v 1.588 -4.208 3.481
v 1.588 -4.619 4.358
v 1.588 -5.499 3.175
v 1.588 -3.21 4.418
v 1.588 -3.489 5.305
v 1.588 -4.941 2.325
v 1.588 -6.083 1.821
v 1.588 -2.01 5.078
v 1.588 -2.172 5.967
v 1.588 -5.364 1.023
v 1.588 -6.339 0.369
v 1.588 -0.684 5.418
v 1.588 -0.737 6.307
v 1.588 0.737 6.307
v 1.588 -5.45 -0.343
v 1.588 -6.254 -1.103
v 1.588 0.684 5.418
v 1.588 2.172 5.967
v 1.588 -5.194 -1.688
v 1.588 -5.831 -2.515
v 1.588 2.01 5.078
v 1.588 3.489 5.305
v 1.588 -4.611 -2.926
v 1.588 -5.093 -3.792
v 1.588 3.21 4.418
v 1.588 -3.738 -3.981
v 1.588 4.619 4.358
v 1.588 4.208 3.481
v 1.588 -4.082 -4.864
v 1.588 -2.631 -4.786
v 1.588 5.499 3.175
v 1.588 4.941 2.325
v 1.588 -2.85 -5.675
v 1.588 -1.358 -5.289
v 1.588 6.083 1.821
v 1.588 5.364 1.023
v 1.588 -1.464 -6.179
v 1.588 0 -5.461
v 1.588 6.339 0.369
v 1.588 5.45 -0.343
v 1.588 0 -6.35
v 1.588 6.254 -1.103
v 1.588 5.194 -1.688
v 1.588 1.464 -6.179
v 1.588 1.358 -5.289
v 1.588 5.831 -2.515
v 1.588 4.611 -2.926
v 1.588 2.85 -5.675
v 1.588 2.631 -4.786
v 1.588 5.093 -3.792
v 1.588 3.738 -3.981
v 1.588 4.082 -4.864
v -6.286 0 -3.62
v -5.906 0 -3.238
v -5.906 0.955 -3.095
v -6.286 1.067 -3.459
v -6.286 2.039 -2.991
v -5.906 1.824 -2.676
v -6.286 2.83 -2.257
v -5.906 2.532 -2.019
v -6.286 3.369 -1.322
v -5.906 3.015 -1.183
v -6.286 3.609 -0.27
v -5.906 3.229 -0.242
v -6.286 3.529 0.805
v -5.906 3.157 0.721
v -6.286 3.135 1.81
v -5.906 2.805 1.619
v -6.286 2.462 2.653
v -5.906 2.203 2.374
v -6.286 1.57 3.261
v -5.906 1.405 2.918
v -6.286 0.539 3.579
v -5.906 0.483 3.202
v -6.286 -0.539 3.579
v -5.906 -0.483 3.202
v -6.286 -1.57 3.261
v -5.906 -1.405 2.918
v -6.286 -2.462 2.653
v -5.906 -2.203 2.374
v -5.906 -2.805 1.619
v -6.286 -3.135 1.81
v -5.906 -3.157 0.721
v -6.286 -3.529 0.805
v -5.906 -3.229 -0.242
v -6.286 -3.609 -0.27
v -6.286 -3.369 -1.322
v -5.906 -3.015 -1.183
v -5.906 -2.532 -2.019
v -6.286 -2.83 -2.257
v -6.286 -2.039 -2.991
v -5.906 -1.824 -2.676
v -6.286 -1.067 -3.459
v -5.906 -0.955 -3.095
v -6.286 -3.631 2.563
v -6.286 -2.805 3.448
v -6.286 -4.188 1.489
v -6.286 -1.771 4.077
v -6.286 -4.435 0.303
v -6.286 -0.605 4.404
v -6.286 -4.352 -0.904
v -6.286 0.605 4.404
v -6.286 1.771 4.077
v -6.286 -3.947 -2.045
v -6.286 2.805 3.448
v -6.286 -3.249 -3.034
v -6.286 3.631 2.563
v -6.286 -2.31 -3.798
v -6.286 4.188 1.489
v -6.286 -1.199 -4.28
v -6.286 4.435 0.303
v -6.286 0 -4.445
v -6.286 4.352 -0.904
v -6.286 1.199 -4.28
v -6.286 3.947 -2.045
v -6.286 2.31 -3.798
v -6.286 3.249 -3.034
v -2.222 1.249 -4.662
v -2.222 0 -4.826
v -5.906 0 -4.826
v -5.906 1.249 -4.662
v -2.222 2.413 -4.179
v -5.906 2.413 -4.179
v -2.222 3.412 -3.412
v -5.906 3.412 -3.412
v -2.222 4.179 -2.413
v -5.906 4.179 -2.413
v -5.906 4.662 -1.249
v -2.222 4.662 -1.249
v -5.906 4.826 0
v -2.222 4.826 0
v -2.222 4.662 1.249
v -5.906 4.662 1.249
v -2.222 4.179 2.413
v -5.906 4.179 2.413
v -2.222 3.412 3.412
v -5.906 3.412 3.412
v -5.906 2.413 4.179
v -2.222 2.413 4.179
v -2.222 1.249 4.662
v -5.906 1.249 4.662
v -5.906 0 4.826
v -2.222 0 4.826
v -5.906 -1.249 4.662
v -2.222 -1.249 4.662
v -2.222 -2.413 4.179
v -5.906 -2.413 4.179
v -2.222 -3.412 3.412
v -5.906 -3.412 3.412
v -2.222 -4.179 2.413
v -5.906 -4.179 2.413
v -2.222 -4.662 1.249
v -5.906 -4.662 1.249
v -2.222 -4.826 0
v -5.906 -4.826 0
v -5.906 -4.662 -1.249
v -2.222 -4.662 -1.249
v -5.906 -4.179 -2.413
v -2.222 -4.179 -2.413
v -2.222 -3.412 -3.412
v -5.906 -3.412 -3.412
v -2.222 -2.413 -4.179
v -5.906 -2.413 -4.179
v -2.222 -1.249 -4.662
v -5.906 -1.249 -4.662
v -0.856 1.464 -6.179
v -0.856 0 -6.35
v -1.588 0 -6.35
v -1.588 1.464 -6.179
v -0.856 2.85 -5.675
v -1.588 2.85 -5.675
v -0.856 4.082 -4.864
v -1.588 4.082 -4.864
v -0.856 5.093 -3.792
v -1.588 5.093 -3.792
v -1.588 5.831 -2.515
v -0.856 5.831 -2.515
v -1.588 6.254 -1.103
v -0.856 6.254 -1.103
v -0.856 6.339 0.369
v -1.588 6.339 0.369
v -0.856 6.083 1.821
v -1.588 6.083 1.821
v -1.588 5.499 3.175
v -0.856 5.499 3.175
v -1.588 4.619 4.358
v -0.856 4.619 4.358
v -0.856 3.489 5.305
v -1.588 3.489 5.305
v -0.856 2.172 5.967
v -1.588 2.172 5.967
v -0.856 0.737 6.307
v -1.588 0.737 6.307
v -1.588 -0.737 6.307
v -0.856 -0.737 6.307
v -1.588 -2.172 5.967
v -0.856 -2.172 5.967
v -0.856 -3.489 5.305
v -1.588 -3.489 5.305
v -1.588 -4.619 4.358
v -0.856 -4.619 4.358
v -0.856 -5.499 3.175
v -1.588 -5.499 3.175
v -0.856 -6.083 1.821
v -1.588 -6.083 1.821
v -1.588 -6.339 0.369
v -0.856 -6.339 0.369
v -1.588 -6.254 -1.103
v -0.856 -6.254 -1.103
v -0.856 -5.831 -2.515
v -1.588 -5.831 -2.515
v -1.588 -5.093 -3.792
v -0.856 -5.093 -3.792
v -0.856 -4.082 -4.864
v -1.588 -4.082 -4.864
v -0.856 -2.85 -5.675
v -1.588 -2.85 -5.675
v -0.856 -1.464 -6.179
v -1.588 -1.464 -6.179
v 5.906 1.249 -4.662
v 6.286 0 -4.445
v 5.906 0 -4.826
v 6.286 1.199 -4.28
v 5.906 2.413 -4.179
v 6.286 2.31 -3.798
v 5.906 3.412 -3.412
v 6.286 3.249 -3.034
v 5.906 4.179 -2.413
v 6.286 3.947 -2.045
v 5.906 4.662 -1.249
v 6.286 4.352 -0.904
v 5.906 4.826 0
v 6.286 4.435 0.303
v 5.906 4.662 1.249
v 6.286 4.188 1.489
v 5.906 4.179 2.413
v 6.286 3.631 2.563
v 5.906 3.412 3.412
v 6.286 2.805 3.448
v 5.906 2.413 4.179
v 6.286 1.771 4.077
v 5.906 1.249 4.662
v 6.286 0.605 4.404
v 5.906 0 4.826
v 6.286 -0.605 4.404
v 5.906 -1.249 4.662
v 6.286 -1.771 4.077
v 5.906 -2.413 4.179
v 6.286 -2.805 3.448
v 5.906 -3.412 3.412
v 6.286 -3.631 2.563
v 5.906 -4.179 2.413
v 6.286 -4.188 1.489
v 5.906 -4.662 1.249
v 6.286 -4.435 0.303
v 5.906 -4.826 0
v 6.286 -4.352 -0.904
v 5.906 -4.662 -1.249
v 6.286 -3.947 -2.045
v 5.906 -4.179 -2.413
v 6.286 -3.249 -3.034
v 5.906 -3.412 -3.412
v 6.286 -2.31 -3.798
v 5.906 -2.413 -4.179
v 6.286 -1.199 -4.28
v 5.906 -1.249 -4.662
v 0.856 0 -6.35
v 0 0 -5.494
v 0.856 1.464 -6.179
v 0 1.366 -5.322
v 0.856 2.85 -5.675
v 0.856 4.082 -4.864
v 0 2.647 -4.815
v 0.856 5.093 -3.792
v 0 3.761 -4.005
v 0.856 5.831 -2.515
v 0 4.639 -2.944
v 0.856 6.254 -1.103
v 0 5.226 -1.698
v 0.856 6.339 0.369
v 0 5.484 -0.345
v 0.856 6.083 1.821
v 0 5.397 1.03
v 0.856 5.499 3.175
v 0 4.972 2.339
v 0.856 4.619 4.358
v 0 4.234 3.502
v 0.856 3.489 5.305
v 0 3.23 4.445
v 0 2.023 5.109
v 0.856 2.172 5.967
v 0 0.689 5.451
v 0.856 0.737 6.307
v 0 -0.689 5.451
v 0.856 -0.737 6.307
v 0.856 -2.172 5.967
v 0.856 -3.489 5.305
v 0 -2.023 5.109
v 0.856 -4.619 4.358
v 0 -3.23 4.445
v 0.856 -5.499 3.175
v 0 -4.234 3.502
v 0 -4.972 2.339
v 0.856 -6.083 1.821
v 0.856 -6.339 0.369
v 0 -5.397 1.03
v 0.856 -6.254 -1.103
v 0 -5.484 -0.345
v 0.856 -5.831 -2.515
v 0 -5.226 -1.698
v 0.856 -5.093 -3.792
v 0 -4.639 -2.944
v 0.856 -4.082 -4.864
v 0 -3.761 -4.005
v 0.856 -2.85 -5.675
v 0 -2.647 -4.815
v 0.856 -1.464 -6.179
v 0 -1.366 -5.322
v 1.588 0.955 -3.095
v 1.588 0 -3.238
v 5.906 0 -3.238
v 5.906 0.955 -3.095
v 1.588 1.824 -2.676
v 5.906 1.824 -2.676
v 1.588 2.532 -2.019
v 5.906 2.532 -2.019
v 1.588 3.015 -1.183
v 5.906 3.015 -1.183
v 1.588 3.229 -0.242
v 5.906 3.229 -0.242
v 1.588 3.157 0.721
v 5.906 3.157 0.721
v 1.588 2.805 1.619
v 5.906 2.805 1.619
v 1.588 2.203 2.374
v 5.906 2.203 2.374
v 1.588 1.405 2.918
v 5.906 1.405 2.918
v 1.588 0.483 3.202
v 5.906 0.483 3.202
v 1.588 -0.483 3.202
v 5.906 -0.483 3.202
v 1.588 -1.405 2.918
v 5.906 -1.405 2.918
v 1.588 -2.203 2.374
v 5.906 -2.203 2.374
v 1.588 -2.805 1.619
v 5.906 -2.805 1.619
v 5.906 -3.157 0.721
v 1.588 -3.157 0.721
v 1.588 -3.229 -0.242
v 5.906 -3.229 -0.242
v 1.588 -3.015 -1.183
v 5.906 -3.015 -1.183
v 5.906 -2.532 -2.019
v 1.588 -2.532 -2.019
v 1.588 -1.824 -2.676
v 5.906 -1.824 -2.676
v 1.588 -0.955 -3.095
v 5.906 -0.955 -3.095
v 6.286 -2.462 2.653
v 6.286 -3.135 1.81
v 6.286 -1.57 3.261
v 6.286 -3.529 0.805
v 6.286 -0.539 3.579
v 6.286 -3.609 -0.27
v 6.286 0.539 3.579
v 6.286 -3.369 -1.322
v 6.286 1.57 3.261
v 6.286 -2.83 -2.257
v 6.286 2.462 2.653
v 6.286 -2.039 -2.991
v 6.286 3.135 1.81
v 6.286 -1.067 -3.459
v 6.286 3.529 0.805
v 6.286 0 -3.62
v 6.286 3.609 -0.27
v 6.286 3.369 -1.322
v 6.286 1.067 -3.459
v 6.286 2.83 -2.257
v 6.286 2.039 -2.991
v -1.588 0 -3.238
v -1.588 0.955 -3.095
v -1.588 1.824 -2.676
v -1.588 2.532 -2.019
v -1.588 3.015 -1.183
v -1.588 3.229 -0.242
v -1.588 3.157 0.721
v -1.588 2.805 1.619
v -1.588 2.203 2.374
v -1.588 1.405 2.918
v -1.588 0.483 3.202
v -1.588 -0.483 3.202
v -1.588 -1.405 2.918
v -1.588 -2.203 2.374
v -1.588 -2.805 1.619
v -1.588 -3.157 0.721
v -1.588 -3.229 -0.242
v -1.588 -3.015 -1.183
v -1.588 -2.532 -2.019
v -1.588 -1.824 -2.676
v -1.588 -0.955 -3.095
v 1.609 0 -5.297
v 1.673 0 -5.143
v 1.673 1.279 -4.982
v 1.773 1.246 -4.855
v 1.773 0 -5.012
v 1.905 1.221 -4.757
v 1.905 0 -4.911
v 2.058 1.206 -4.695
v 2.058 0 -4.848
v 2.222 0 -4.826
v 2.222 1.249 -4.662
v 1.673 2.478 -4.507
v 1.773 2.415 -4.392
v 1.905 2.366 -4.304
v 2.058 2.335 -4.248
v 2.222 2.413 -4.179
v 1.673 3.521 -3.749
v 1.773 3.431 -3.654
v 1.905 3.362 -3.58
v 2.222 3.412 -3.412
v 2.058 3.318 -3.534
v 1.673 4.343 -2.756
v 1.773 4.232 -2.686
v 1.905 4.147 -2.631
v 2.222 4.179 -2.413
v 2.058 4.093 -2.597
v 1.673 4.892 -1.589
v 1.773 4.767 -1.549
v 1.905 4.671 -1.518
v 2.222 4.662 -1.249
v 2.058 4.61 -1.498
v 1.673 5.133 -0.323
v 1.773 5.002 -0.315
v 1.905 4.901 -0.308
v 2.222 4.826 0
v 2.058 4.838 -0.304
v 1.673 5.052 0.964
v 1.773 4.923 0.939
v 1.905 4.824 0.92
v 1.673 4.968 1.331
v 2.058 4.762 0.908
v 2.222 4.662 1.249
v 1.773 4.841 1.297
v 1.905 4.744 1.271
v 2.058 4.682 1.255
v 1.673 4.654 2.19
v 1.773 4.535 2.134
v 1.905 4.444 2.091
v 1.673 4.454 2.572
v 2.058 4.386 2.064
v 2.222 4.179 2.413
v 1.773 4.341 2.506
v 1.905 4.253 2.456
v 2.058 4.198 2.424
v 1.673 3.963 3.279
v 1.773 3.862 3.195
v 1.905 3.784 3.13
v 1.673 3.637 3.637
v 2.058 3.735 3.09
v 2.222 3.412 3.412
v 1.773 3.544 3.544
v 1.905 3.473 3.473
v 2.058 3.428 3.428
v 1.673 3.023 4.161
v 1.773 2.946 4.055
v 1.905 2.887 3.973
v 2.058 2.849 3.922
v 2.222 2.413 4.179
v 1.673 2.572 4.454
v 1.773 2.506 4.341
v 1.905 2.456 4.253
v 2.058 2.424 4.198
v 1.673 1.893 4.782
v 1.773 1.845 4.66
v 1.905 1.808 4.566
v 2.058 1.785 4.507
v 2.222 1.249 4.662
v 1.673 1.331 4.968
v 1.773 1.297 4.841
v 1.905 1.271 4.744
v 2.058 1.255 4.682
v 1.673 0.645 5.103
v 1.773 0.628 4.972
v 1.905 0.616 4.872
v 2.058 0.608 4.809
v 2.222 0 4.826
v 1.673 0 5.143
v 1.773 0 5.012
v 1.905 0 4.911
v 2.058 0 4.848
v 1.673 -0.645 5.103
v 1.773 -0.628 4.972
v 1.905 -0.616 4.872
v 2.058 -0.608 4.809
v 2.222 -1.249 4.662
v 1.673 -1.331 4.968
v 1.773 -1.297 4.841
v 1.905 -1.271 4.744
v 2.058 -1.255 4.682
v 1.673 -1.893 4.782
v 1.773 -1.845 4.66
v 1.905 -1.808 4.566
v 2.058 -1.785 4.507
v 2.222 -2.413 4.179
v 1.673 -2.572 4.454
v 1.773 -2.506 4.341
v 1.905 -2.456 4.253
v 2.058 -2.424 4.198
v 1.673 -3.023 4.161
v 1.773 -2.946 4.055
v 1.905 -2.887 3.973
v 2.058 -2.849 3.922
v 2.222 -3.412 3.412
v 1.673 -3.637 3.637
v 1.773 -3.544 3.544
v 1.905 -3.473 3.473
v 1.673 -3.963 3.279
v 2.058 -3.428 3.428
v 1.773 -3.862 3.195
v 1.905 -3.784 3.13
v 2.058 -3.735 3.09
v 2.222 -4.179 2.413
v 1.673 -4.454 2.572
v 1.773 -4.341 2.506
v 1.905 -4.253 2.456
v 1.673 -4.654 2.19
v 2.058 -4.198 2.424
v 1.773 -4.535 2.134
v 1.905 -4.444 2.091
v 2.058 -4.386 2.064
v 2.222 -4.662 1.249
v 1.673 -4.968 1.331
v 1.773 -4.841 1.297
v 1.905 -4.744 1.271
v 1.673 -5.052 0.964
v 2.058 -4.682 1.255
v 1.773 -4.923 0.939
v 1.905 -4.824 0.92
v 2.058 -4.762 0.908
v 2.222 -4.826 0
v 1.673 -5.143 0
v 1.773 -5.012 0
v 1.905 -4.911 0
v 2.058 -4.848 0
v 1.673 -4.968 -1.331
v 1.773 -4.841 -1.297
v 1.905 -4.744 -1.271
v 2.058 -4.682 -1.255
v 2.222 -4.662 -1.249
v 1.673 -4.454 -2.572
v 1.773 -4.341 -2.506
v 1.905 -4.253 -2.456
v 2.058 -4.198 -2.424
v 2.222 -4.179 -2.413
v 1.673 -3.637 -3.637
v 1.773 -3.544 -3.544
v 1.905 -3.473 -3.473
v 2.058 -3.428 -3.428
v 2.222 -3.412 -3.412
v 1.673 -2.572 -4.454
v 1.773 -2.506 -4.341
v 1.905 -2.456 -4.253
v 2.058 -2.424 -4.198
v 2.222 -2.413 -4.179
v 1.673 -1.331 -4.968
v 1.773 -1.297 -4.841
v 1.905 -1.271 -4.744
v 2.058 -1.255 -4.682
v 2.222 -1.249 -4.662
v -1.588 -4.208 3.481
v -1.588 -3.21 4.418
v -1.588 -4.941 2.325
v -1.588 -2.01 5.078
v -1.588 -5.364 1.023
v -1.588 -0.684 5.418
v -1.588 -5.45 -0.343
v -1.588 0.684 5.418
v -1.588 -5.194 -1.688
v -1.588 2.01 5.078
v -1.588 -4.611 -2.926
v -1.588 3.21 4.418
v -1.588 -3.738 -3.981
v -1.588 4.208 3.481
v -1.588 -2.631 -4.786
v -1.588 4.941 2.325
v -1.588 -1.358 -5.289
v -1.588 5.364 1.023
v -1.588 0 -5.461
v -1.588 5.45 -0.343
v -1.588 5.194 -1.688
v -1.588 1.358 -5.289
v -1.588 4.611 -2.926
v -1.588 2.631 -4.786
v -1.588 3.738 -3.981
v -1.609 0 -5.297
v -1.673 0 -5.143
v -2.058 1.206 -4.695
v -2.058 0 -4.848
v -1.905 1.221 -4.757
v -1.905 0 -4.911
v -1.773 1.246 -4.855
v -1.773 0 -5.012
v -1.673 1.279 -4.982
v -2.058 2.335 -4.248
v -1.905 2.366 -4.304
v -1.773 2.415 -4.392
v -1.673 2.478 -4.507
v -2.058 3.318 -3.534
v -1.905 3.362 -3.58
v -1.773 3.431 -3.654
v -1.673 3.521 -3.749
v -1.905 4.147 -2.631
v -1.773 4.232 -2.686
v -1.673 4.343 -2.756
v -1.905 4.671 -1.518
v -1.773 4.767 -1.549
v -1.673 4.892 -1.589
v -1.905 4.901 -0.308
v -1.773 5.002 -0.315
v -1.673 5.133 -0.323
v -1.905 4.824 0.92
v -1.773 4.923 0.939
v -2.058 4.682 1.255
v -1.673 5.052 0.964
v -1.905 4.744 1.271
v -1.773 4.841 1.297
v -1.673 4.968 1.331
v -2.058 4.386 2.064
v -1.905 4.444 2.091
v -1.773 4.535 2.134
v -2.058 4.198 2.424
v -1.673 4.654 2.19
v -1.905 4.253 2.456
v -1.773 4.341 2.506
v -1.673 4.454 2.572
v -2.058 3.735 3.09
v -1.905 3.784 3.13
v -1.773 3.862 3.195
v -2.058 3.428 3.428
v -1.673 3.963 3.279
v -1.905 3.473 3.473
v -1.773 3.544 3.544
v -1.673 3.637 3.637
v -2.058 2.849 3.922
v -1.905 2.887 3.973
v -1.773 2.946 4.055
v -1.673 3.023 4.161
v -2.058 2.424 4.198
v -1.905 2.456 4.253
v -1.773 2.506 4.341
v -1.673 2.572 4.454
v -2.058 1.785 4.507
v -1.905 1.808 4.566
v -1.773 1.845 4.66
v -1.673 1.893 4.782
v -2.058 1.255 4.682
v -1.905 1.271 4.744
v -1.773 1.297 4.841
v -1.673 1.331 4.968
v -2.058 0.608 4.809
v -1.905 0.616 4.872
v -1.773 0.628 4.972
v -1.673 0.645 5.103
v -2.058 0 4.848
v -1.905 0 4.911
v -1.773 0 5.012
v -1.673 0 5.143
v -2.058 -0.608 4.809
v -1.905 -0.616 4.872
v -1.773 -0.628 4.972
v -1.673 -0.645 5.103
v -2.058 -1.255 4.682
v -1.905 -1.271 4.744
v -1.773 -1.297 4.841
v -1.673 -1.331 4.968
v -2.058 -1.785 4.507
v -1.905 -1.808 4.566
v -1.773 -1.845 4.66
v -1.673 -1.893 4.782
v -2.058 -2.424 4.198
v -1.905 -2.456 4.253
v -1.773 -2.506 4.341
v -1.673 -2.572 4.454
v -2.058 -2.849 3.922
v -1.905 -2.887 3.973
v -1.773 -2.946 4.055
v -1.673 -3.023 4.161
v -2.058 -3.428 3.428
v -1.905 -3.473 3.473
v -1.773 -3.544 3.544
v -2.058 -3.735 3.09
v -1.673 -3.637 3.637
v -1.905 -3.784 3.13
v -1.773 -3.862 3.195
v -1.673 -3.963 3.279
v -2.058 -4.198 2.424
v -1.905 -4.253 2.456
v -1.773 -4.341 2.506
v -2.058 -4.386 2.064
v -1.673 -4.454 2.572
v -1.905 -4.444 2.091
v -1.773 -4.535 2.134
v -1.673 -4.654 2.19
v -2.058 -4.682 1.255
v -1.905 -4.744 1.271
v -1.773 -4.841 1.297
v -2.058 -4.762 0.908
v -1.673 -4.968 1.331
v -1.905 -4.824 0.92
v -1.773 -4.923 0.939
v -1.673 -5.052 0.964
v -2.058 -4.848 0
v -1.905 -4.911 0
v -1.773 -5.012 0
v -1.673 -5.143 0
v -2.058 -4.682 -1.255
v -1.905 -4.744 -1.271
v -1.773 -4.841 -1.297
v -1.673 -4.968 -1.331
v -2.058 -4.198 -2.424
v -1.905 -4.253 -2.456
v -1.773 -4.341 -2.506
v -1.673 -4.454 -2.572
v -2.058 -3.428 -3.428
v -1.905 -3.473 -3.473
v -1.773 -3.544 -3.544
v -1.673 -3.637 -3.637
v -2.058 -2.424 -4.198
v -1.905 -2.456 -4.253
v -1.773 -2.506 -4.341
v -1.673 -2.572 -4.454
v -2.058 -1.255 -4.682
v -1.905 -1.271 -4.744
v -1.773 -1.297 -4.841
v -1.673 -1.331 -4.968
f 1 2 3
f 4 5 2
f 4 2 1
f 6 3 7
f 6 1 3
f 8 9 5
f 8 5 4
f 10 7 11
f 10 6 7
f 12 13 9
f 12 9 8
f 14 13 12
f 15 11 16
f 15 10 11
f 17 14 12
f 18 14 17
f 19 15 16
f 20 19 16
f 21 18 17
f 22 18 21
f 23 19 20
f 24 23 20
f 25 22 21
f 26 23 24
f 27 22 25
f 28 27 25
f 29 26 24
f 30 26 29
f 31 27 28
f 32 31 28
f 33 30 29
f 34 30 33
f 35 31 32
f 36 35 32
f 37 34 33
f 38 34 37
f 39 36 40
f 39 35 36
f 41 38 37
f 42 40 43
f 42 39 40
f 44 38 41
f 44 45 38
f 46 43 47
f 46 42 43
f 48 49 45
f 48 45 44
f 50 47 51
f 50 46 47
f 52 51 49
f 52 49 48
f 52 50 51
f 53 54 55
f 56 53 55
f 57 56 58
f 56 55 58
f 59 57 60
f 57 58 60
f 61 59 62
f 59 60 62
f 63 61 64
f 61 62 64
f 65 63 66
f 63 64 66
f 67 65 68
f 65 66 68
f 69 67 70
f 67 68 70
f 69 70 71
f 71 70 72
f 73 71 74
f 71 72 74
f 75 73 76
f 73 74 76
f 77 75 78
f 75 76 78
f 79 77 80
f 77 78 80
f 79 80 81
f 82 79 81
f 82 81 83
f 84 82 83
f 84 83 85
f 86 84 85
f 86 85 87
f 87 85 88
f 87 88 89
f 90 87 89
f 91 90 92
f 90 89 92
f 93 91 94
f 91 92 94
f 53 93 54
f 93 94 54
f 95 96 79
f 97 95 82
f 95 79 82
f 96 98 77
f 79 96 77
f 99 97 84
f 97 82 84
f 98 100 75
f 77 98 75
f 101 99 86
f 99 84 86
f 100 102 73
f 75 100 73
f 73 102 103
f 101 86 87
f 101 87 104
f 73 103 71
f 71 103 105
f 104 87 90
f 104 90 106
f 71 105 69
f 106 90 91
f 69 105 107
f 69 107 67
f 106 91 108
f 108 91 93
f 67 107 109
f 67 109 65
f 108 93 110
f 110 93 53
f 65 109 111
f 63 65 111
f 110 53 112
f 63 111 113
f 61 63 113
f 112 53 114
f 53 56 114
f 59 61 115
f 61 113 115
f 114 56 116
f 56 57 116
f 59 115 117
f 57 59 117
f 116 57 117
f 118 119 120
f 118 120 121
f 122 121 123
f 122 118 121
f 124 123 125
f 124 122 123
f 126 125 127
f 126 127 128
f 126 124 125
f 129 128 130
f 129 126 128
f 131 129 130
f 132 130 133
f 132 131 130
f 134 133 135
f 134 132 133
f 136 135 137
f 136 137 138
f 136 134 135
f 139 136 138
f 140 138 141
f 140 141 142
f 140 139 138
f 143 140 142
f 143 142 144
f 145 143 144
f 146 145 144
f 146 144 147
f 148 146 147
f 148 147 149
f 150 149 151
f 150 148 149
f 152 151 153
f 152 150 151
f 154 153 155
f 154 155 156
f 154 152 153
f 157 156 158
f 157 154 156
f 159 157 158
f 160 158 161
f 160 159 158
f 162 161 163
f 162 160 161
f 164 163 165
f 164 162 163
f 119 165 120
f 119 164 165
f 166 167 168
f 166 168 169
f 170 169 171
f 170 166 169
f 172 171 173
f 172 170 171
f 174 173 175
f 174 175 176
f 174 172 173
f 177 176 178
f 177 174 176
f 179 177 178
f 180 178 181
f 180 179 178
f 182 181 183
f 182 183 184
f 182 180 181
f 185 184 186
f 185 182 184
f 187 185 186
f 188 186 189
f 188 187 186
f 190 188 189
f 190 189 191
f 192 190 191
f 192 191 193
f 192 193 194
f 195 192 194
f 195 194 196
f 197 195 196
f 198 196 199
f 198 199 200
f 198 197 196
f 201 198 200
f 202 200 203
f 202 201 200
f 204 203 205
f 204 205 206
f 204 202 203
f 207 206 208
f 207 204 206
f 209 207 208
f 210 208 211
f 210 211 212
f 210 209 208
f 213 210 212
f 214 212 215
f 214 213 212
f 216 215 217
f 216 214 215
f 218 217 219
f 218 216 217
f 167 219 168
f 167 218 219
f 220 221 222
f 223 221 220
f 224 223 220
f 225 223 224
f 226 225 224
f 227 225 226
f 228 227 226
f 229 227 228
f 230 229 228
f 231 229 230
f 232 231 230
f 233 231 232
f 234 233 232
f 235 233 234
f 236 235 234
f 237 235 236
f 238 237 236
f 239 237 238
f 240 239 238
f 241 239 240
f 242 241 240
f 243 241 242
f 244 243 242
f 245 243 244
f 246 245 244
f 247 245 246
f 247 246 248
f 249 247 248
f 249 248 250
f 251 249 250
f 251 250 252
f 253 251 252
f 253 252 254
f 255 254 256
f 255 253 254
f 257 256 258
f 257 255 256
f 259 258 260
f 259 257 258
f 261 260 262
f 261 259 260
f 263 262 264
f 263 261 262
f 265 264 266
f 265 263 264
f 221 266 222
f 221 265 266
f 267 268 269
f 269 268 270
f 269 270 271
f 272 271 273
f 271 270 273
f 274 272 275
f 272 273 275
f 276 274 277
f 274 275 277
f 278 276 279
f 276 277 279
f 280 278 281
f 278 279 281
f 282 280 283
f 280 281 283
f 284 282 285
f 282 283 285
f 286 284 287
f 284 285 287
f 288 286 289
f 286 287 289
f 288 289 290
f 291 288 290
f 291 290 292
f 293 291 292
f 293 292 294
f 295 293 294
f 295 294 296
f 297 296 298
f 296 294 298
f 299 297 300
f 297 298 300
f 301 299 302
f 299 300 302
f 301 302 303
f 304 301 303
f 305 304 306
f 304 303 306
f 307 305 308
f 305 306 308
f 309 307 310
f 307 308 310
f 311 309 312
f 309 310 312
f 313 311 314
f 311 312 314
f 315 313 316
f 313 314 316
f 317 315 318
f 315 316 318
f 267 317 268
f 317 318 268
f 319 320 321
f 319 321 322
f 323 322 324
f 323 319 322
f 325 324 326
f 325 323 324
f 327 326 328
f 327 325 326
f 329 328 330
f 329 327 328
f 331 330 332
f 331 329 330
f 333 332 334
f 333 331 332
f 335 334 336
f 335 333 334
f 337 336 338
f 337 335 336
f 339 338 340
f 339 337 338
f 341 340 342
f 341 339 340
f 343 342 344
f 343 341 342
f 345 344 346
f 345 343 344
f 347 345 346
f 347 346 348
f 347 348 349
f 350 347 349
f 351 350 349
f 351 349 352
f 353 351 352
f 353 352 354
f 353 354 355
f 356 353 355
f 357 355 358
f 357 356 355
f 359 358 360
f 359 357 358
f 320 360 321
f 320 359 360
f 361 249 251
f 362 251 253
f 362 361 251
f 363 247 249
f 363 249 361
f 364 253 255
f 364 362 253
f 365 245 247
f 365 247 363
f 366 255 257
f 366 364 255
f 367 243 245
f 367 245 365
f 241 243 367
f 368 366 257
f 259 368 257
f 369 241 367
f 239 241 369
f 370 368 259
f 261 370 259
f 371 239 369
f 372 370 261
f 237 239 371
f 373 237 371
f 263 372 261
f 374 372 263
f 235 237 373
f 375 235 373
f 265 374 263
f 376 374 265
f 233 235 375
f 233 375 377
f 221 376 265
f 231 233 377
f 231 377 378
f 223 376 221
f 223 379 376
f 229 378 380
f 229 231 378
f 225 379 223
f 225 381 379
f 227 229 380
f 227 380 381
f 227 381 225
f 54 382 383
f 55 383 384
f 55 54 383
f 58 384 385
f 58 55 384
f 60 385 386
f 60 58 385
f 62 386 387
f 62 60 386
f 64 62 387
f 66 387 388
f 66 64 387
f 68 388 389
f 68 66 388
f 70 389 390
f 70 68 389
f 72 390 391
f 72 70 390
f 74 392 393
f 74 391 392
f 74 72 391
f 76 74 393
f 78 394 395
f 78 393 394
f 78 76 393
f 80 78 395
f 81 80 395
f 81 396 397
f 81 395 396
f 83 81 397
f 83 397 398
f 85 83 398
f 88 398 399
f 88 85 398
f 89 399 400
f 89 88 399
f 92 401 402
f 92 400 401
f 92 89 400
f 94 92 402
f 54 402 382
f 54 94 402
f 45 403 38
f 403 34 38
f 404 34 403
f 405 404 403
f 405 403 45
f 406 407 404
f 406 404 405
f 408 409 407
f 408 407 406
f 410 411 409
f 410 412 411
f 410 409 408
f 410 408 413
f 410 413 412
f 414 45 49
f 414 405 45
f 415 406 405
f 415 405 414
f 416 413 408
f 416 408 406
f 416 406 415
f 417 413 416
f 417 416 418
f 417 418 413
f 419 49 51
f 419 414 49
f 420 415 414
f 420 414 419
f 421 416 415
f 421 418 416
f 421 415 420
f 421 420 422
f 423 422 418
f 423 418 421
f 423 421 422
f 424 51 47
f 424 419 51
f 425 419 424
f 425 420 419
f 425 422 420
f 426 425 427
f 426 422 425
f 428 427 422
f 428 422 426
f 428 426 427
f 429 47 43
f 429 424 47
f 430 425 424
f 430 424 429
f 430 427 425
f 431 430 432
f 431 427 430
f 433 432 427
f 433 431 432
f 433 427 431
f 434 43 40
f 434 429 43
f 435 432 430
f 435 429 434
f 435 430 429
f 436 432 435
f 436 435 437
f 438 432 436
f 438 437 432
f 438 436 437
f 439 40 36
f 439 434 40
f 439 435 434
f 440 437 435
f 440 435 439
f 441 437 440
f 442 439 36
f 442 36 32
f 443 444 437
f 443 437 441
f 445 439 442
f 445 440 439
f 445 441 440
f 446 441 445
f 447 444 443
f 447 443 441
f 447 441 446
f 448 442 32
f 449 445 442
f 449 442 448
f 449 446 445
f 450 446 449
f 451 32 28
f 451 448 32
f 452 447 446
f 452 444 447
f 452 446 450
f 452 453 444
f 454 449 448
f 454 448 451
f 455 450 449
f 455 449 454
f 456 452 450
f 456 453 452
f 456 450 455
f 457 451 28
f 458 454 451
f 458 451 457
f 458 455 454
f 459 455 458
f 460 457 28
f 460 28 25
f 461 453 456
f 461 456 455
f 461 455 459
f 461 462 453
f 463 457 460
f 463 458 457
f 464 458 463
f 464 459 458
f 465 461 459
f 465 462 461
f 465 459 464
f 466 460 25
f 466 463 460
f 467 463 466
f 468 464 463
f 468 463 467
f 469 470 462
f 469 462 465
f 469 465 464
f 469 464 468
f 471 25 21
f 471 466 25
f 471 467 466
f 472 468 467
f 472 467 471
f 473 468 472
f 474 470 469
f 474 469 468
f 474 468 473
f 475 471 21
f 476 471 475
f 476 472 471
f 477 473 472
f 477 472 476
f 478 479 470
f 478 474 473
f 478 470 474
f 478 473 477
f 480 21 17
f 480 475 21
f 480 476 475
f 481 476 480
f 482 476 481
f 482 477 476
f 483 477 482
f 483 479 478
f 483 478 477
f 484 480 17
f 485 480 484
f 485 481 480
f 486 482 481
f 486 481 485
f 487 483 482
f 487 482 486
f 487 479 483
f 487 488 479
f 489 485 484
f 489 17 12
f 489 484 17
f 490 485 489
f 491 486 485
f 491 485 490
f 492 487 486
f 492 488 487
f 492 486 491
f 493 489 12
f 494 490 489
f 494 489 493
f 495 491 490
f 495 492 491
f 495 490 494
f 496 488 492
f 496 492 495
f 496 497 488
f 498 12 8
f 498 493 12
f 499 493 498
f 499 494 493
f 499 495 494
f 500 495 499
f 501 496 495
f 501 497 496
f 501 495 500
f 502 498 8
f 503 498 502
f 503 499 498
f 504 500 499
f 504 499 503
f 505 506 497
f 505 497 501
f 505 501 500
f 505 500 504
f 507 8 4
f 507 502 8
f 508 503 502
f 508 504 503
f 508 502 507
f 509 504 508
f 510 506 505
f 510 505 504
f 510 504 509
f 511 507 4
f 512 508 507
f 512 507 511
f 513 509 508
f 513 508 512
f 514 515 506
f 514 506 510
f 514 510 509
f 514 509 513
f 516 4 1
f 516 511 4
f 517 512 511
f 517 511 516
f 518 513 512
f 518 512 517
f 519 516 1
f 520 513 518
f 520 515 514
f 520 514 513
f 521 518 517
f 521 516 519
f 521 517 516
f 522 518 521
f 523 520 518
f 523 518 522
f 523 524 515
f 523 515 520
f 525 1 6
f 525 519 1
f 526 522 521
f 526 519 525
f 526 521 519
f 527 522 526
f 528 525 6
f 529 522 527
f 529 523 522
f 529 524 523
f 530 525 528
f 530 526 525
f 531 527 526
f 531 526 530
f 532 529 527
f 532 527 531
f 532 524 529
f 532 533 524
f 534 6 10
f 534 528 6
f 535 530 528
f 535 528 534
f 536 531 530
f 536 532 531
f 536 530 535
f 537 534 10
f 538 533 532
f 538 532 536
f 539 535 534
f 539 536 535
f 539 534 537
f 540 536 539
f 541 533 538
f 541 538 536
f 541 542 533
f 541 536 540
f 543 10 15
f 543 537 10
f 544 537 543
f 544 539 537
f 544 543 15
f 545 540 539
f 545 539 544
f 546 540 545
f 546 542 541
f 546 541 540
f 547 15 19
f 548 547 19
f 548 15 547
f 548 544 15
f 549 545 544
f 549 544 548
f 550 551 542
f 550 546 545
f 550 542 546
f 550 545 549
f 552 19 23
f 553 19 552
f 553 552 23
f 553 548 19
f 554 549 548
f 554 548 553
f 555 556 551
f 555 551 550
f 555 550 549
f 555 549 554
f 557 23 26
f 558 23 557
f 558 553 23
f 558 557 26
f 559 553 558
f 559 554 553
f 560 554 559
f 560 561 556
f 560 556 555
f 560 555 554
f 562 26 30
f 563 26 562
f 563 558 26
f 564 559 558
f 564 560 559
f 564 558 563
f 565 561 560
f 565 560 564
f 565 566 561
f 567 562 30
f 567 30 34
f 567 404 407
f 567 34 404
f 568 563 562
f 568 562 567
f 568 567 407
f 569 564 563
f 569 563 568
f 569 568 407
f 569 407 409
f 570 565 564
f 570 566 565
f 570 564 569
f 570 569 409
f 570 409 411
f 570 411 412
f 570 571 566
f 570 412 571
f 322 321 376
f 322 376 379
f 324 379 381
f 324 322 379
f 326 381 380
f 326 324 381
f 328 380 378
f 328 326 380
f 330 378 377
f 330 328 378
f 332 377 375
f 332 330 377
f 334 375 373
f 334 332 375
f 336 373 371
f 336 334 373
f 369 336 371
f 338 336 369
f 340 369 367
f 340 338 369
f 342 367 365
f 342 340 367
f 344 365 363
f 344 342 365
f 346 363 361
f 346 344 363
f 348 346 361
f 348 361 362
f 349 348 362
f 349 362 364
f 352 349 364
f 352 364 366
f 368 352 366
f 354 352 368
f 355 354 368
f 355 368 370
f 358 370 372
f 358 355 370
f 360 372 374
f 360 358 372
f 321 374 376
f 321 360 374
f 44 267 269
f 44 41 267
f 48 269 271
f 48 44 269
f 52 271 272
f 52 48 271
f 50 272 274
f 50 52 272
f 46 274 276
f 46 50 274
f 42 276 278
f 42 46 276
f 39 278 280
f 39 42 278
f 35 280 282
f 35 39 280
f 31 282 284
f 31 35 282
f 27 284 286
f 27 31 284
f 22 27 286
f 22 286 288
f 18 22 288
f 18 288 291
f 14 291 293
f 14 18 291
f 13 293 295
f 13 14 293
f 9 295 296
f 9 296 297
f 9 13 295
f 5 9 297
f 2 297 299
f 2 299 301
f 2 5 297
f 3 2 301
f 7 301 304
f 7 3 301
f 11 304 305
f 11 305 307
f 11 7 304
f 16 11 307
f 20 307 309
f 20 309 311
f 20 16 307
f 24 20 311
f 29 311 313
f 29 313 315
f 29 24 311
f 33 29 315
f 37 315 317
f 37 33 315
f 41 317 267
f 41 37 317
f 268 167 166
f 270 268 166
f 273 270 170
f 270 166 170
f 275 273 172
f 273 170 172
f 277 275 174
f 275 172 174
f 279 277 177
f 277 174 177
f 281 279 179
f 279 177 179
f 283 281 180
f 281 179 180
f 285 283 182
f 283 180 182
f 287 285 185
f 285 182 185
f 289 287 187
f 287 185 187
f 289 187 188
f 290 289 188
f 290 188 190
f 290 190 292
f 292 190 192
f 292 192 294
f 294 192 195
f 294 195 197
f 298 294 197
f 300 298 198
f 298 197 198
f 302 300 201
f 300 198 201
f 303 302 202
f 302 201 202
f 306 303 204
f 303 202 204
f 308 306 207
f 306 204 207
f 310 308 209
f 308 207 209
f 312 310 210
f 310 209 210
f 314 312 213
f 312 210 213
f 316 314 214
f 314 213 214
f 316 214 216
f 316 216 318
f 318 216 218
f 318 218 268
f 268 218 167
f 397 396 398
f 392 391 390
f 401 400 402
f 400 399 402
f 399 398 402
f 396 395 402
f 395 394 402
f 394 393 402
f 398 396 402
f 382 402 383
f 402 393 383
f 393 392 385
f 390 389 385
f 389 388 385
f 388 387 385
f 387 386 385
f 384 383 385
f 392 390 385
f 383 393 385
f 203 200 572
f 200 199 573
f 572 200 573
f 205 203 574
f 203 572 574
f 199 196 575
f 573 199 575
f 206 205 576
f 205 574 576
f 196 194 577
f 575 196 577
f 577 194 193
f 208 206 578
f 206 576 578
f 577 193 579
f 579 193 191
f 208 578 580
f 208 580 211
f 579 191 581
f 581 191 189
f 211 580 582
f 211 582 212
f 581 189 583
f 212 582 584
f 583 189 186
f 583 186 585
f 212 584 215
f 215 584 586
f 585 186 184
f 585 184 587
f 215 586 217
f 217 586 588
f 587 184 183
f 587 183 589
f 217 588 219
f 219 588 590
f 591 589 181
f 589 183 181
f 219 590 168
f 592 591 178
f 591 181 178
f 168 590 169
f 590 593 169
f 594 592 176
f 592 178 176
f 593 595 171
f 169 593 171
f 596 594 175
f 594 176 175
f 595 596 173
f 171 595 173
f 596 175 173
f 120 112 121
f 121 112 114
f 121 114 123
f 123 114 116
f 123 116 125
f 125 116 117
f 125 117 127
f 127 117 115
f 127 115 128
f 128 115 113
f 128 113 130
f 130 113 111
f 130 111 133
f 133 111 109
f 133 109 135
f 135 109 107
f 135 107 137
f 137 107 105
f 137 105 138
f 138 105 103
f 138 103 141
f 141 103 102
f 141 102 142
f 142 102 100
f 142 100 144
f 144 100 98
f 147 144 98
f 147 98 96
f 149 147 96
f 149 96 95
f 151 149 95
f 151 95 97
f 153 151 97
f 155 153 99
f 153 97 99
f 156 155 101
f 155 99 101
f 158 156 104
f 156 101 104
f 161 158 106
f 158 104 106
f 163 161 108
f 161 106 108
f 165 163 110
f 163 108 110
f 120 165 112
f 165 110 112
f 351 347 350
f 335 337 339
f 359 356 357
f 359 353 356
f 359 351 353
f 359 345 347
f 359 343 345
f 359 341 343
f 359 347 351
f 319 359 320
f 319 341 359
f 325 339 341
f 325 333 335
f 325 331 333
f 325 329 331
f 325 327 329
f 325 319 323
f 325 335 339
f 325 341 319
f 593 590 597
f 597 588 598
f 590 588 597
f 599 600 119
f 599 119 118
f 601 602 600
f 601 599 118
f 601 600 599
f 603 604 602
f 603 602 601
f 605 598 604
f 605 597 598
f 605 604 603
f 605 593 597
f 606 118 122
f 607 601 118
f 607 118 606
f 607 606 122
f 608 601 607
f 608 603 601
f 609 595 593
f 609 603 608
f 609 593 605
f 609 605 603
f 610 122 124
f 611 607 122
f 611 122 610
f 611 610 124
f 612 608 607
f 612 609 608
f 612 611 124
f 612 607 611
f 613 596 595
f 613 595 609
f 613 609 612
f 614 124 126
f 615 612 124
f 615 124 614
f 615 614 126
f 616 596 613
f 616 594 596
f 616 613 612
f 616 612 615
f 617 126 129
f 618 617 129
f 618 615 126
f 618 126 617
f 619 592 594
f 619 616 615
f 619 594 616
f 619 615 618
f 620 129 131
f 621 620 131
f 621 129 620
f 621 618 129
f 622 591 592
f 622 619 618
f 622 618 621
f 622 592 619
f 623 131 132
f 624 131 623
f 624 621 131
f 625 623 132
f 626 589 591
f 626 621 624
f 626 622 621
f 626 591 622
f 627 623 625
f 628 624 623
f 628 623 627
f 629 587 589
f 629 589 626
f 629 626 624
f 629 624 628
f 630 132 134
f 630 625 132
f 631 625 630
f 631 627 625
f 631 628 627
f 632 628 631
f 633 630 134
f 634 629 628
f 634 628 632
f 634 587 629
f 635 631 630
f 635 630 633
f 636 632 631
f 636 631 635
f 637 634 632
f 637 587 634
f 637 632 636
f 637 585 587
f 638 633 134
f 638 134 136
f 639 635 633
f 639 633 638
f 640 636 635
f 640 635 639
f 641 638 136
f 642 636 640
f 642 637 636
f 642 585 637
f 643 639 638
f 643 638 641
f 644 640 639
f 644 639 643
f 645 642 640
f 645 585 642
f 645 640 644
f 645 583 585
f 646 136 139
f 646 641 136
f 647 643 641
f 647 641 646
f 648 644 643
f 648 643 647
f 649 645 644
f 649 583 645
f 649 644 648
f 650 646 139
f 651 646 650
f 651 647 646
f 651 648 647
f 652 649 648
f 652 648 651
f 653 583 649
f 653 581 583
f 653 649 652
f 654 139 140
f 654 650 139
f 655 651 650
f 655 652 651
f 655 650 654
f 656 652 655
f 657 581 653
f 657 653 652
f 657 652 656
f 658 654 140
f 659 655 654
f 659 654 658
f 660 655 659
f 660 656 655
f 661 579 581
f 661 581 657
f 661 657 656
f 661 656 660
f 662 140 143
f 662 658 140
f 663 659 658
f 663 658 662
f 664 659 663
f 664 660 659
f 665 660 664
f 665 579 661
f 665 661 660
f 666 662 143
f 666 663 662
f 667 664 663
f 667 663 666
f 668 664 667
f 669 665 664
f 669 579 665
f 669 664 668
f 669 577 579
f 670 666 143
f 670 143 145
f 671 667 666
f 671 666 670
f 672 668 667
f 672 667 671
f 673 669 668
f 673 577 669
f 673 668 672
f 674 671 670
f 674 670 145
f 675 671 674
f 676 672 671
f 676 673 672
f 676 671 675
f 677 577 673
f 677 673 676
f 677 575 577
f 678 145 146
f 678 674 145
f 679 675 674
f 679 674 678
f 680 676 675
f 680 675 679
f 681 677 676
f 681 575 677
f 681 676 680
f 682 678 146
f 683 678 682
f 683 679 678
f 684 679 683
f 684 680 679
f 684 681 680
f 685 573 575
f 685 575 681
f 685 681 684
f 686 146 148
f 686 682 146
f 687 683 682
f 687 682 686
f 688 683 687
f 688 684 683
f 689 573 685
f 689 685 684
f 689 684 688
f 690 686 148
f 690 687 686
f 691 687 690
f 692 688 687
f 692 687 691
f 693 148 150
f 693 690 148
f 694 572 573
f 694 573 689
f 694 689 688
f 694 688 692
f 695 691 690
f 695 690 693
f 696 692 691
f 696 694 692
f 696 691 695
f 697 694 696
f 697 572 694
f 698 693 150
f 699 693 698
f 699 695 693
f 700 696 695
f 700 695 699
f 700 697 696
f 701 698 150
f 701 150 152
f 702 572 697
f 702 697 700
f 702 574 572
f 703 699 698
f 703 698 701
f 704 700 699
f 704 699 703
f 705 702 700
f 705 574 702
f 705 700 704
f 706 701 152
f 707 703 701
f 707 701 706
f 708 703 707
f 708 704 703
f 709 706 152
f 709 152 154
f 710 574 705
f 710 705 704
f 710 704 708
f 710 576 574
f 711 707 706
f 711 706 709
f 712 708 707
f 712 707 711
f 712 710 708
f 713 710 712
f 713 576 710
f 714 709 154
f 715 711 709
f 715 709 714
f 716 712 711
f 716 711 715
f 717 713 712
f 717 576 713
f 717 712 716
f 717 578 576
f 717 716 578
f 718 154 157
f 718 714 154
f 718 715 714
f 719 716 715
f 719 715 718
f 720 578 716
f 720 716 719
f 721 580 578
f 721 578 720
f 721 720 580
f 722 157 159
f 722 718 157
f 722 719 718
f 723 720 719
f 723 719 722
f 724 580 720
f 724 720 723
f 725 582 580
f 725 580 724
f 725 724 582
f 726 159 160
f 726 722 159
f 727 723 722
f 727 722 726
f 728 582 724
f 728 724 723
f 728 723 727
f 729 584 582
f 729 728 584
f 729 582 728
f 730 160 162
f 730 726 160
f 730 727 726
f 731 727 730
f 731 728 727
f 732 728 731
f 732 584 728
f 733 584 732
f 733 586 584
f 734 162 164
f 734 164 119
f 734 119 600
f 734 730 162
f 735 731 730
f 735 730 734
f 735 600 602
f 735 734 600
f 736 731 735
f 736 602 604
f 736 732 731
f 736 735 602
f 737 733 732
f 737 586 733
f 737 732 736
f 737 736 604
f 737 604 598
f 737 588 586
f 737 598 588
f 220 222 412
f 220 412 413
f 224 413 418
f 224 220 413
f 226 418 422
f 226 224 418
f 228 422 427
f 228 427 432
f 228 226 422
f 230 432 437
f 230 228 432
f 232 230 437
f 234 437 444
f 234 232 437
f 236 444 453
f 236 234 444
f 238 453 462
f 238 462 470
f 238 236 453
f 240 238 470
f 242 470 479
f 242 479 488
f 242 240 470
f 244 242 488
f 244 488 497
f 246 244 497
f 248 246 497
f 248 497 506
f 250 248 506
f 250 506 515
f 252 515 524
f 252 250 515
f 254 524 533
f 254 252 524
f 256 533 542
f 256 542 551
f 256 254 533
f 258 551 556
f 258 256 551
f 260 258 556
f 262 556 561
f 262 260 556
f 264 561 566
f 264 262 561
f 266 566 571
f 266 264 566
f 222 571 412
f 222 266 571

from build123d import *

# Parameters (mm, degrees)
SKETCH1_R           = 6.35
BOSS_EXTRUDE1_DEPTH = 1.5875
SKETCH2_R           = 4.826
SKETCH2_R_2         = 3.2385
BOSS_EXTRUDE2_DEPTH = 6.2865
CHAMFER1_SIZE       = 0.381
FILLET2_R           = 0.635


with BuildPart() as part:
    # Sketch1 → Boss-Extrude1 (new body, symmetric)
    with BuildSketch(Plane(origin=(0, 0, 0), x_dir=(0, 0, -1), z_dir=(1, 0, 0))):
        Circle(SKETCH1_R)
    extrude(amount=BOSS_EXTRUDE1_DEPTH, both=True)

    # Sketch2 → Boss-Extrude2 (add, symmetric)
    with BuildSketch(Plane(origin=(0, 0, 0), x_dir=(0, 0, -1), z_dir=(1, 0, 0))):
        Circle(SKETCH2_R)
        Circle(SKETCH2_R_2, mode=Mode.SUBTRACT)
    extrude(amount=BOSS_EXTRUDE2_DEPTH, both=True)

    # Chamfer1
    chamfer1_edges = [part.edges().sort_by_distance(p)[0] for p in [
        (-6.2865, 0, 4.826),
        (6.2865, 0, 4.826),
        (-6.2865, 0, 3.2385),
        (6.2865, 0, 3.2385),
    ]]
    chamfer(chamfer1_edges, length=CHAMFER1_SIZE)

    # Fillet2
    fillet2_edges = [part.edges().sort_by_distance(p)[0] for p in [
        (-1.5875, 0, 4.826),
        (1.5875, 0, 4.826),
    ]]
    fillet(fillet2_edges, radius=FILLET2_R)

    # Cut-Sweep1: sweep along a path in Sketch3
    with BuildLine(Plane(origin=(0, 0, 0), x_dir=(0, 0, -1), z_dir=(1, 0, 0))) as cut_sweep1_path:
        CenterArc((0, 0), 6.35, 0, 360)
    # Sketch7 → Cut-Sweep1 (sweep, cut)
    with BuildSketch(Plane(origin=(0, 0, 0), x_dir=(1, 0, 0), z_dir=(0, 1, 0))):
        Polygon((1.27, -6.764445418), (-1.27, -6.764445418), (0, -5.494445418), align=None)
    sweep(path=cut_sweep1_path.line, mode=Mode.SUBTRACT)


solid = part.part
